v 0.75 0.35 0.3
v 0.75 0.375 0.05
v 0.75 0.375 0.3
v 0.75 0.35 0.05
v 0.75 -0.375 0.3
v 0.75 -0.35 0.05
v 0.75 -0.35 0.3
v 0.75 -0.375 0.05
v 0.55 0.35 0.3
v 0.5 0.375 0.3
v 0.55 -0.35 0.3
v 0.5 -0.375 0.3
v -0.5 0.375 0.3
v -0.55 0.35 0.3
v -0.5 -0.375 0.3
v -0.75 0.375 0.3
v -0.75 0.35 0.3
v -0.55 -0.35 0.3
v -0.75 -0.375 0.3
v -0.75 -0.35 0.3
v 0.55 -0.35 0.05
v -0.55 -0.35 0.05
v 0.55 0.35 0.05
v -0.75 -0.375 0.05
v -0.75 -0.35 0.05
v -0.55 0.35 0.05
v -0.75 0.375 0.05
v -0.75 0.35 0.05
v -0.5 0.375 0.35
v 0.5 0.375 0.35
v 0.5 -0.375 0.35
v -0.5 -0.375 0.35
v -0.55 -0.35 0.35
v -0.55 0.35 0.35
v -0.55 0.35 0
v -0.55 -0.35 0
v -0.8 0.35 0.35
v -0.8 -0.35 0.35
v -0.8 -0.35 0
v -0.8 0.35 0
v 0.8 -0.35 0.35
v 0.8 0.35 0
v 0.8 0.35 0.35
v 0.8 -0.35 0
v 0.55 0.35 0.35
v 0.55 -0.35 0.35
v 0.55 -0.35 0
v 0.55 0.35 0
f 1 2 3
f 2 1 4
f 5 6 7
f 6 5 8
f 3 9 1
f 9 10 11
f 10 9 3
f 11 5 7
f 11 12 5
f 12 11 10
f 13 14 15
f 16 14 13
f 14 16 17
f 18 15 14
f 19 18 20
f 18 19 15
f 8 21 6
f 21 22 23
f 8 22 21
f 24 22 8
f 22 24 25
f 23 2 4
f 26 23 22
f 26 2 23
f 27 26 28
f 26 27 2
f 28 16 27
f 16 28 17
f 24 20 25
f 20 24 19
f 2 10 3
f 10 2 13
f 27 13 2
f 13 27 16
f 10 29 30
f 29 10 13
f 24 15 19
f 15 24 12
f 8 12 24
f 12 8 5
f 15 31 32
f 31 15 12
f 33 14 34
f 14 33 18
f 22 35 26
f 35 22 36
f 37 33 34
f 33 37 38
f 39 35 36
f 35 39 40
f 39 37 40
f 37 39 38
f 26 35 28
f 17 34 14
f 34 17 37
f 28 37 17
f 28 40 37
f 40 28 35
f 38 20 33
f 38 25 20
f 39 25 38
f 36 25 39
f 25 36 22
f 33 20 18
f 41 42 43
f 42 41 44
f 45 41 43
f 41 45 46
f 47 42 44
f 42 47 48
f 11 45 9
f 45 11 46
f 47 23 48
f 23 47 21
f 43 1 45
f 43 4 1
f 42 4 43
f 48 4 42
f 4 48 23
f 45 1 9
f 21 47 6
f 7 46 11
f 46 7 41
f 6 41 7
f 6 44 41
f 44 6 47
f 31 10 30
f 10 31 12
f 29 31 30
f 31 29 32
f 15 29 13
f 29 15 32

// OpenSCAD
length = 1.5;
width = 0.75;
body_thickness = 0.25;
termination_thickness = 0.05;
termination_length = 0.25;


color("#fff") translate([0, 0, body_thickness/2 + termination_thickness]) cube([length, width, body_thickness], center = true);

color("#aaa") translate([-length/2 + termination_length/2 - termination_thickness, 0, body_thickness/2 + termination_thickness])
    cube([termination_length, width - termination_thickness, body_thickness + termination_thickness * 2], center = true);
    
color("#aaa") translate([length/2 - termination_length/2 + termination_thickness, 0, body_thickness/2 + termination_thickness])
    cube([termination_length, width - termination_thickness, body_thickness + termination_thickness * 2], center = true);
    
    
color("#eee") translate([0, width/4, body_thickness + termination_thickness * 1.5]) cube([length - termination_length * 2, width/2, termination_thickness], center = true);
color("#393") translate([0, -width/4, body_thickness + termination_thickness * 1.5]) cube([length - termination_length * 2, width/2, termination_thickness], center = true);
